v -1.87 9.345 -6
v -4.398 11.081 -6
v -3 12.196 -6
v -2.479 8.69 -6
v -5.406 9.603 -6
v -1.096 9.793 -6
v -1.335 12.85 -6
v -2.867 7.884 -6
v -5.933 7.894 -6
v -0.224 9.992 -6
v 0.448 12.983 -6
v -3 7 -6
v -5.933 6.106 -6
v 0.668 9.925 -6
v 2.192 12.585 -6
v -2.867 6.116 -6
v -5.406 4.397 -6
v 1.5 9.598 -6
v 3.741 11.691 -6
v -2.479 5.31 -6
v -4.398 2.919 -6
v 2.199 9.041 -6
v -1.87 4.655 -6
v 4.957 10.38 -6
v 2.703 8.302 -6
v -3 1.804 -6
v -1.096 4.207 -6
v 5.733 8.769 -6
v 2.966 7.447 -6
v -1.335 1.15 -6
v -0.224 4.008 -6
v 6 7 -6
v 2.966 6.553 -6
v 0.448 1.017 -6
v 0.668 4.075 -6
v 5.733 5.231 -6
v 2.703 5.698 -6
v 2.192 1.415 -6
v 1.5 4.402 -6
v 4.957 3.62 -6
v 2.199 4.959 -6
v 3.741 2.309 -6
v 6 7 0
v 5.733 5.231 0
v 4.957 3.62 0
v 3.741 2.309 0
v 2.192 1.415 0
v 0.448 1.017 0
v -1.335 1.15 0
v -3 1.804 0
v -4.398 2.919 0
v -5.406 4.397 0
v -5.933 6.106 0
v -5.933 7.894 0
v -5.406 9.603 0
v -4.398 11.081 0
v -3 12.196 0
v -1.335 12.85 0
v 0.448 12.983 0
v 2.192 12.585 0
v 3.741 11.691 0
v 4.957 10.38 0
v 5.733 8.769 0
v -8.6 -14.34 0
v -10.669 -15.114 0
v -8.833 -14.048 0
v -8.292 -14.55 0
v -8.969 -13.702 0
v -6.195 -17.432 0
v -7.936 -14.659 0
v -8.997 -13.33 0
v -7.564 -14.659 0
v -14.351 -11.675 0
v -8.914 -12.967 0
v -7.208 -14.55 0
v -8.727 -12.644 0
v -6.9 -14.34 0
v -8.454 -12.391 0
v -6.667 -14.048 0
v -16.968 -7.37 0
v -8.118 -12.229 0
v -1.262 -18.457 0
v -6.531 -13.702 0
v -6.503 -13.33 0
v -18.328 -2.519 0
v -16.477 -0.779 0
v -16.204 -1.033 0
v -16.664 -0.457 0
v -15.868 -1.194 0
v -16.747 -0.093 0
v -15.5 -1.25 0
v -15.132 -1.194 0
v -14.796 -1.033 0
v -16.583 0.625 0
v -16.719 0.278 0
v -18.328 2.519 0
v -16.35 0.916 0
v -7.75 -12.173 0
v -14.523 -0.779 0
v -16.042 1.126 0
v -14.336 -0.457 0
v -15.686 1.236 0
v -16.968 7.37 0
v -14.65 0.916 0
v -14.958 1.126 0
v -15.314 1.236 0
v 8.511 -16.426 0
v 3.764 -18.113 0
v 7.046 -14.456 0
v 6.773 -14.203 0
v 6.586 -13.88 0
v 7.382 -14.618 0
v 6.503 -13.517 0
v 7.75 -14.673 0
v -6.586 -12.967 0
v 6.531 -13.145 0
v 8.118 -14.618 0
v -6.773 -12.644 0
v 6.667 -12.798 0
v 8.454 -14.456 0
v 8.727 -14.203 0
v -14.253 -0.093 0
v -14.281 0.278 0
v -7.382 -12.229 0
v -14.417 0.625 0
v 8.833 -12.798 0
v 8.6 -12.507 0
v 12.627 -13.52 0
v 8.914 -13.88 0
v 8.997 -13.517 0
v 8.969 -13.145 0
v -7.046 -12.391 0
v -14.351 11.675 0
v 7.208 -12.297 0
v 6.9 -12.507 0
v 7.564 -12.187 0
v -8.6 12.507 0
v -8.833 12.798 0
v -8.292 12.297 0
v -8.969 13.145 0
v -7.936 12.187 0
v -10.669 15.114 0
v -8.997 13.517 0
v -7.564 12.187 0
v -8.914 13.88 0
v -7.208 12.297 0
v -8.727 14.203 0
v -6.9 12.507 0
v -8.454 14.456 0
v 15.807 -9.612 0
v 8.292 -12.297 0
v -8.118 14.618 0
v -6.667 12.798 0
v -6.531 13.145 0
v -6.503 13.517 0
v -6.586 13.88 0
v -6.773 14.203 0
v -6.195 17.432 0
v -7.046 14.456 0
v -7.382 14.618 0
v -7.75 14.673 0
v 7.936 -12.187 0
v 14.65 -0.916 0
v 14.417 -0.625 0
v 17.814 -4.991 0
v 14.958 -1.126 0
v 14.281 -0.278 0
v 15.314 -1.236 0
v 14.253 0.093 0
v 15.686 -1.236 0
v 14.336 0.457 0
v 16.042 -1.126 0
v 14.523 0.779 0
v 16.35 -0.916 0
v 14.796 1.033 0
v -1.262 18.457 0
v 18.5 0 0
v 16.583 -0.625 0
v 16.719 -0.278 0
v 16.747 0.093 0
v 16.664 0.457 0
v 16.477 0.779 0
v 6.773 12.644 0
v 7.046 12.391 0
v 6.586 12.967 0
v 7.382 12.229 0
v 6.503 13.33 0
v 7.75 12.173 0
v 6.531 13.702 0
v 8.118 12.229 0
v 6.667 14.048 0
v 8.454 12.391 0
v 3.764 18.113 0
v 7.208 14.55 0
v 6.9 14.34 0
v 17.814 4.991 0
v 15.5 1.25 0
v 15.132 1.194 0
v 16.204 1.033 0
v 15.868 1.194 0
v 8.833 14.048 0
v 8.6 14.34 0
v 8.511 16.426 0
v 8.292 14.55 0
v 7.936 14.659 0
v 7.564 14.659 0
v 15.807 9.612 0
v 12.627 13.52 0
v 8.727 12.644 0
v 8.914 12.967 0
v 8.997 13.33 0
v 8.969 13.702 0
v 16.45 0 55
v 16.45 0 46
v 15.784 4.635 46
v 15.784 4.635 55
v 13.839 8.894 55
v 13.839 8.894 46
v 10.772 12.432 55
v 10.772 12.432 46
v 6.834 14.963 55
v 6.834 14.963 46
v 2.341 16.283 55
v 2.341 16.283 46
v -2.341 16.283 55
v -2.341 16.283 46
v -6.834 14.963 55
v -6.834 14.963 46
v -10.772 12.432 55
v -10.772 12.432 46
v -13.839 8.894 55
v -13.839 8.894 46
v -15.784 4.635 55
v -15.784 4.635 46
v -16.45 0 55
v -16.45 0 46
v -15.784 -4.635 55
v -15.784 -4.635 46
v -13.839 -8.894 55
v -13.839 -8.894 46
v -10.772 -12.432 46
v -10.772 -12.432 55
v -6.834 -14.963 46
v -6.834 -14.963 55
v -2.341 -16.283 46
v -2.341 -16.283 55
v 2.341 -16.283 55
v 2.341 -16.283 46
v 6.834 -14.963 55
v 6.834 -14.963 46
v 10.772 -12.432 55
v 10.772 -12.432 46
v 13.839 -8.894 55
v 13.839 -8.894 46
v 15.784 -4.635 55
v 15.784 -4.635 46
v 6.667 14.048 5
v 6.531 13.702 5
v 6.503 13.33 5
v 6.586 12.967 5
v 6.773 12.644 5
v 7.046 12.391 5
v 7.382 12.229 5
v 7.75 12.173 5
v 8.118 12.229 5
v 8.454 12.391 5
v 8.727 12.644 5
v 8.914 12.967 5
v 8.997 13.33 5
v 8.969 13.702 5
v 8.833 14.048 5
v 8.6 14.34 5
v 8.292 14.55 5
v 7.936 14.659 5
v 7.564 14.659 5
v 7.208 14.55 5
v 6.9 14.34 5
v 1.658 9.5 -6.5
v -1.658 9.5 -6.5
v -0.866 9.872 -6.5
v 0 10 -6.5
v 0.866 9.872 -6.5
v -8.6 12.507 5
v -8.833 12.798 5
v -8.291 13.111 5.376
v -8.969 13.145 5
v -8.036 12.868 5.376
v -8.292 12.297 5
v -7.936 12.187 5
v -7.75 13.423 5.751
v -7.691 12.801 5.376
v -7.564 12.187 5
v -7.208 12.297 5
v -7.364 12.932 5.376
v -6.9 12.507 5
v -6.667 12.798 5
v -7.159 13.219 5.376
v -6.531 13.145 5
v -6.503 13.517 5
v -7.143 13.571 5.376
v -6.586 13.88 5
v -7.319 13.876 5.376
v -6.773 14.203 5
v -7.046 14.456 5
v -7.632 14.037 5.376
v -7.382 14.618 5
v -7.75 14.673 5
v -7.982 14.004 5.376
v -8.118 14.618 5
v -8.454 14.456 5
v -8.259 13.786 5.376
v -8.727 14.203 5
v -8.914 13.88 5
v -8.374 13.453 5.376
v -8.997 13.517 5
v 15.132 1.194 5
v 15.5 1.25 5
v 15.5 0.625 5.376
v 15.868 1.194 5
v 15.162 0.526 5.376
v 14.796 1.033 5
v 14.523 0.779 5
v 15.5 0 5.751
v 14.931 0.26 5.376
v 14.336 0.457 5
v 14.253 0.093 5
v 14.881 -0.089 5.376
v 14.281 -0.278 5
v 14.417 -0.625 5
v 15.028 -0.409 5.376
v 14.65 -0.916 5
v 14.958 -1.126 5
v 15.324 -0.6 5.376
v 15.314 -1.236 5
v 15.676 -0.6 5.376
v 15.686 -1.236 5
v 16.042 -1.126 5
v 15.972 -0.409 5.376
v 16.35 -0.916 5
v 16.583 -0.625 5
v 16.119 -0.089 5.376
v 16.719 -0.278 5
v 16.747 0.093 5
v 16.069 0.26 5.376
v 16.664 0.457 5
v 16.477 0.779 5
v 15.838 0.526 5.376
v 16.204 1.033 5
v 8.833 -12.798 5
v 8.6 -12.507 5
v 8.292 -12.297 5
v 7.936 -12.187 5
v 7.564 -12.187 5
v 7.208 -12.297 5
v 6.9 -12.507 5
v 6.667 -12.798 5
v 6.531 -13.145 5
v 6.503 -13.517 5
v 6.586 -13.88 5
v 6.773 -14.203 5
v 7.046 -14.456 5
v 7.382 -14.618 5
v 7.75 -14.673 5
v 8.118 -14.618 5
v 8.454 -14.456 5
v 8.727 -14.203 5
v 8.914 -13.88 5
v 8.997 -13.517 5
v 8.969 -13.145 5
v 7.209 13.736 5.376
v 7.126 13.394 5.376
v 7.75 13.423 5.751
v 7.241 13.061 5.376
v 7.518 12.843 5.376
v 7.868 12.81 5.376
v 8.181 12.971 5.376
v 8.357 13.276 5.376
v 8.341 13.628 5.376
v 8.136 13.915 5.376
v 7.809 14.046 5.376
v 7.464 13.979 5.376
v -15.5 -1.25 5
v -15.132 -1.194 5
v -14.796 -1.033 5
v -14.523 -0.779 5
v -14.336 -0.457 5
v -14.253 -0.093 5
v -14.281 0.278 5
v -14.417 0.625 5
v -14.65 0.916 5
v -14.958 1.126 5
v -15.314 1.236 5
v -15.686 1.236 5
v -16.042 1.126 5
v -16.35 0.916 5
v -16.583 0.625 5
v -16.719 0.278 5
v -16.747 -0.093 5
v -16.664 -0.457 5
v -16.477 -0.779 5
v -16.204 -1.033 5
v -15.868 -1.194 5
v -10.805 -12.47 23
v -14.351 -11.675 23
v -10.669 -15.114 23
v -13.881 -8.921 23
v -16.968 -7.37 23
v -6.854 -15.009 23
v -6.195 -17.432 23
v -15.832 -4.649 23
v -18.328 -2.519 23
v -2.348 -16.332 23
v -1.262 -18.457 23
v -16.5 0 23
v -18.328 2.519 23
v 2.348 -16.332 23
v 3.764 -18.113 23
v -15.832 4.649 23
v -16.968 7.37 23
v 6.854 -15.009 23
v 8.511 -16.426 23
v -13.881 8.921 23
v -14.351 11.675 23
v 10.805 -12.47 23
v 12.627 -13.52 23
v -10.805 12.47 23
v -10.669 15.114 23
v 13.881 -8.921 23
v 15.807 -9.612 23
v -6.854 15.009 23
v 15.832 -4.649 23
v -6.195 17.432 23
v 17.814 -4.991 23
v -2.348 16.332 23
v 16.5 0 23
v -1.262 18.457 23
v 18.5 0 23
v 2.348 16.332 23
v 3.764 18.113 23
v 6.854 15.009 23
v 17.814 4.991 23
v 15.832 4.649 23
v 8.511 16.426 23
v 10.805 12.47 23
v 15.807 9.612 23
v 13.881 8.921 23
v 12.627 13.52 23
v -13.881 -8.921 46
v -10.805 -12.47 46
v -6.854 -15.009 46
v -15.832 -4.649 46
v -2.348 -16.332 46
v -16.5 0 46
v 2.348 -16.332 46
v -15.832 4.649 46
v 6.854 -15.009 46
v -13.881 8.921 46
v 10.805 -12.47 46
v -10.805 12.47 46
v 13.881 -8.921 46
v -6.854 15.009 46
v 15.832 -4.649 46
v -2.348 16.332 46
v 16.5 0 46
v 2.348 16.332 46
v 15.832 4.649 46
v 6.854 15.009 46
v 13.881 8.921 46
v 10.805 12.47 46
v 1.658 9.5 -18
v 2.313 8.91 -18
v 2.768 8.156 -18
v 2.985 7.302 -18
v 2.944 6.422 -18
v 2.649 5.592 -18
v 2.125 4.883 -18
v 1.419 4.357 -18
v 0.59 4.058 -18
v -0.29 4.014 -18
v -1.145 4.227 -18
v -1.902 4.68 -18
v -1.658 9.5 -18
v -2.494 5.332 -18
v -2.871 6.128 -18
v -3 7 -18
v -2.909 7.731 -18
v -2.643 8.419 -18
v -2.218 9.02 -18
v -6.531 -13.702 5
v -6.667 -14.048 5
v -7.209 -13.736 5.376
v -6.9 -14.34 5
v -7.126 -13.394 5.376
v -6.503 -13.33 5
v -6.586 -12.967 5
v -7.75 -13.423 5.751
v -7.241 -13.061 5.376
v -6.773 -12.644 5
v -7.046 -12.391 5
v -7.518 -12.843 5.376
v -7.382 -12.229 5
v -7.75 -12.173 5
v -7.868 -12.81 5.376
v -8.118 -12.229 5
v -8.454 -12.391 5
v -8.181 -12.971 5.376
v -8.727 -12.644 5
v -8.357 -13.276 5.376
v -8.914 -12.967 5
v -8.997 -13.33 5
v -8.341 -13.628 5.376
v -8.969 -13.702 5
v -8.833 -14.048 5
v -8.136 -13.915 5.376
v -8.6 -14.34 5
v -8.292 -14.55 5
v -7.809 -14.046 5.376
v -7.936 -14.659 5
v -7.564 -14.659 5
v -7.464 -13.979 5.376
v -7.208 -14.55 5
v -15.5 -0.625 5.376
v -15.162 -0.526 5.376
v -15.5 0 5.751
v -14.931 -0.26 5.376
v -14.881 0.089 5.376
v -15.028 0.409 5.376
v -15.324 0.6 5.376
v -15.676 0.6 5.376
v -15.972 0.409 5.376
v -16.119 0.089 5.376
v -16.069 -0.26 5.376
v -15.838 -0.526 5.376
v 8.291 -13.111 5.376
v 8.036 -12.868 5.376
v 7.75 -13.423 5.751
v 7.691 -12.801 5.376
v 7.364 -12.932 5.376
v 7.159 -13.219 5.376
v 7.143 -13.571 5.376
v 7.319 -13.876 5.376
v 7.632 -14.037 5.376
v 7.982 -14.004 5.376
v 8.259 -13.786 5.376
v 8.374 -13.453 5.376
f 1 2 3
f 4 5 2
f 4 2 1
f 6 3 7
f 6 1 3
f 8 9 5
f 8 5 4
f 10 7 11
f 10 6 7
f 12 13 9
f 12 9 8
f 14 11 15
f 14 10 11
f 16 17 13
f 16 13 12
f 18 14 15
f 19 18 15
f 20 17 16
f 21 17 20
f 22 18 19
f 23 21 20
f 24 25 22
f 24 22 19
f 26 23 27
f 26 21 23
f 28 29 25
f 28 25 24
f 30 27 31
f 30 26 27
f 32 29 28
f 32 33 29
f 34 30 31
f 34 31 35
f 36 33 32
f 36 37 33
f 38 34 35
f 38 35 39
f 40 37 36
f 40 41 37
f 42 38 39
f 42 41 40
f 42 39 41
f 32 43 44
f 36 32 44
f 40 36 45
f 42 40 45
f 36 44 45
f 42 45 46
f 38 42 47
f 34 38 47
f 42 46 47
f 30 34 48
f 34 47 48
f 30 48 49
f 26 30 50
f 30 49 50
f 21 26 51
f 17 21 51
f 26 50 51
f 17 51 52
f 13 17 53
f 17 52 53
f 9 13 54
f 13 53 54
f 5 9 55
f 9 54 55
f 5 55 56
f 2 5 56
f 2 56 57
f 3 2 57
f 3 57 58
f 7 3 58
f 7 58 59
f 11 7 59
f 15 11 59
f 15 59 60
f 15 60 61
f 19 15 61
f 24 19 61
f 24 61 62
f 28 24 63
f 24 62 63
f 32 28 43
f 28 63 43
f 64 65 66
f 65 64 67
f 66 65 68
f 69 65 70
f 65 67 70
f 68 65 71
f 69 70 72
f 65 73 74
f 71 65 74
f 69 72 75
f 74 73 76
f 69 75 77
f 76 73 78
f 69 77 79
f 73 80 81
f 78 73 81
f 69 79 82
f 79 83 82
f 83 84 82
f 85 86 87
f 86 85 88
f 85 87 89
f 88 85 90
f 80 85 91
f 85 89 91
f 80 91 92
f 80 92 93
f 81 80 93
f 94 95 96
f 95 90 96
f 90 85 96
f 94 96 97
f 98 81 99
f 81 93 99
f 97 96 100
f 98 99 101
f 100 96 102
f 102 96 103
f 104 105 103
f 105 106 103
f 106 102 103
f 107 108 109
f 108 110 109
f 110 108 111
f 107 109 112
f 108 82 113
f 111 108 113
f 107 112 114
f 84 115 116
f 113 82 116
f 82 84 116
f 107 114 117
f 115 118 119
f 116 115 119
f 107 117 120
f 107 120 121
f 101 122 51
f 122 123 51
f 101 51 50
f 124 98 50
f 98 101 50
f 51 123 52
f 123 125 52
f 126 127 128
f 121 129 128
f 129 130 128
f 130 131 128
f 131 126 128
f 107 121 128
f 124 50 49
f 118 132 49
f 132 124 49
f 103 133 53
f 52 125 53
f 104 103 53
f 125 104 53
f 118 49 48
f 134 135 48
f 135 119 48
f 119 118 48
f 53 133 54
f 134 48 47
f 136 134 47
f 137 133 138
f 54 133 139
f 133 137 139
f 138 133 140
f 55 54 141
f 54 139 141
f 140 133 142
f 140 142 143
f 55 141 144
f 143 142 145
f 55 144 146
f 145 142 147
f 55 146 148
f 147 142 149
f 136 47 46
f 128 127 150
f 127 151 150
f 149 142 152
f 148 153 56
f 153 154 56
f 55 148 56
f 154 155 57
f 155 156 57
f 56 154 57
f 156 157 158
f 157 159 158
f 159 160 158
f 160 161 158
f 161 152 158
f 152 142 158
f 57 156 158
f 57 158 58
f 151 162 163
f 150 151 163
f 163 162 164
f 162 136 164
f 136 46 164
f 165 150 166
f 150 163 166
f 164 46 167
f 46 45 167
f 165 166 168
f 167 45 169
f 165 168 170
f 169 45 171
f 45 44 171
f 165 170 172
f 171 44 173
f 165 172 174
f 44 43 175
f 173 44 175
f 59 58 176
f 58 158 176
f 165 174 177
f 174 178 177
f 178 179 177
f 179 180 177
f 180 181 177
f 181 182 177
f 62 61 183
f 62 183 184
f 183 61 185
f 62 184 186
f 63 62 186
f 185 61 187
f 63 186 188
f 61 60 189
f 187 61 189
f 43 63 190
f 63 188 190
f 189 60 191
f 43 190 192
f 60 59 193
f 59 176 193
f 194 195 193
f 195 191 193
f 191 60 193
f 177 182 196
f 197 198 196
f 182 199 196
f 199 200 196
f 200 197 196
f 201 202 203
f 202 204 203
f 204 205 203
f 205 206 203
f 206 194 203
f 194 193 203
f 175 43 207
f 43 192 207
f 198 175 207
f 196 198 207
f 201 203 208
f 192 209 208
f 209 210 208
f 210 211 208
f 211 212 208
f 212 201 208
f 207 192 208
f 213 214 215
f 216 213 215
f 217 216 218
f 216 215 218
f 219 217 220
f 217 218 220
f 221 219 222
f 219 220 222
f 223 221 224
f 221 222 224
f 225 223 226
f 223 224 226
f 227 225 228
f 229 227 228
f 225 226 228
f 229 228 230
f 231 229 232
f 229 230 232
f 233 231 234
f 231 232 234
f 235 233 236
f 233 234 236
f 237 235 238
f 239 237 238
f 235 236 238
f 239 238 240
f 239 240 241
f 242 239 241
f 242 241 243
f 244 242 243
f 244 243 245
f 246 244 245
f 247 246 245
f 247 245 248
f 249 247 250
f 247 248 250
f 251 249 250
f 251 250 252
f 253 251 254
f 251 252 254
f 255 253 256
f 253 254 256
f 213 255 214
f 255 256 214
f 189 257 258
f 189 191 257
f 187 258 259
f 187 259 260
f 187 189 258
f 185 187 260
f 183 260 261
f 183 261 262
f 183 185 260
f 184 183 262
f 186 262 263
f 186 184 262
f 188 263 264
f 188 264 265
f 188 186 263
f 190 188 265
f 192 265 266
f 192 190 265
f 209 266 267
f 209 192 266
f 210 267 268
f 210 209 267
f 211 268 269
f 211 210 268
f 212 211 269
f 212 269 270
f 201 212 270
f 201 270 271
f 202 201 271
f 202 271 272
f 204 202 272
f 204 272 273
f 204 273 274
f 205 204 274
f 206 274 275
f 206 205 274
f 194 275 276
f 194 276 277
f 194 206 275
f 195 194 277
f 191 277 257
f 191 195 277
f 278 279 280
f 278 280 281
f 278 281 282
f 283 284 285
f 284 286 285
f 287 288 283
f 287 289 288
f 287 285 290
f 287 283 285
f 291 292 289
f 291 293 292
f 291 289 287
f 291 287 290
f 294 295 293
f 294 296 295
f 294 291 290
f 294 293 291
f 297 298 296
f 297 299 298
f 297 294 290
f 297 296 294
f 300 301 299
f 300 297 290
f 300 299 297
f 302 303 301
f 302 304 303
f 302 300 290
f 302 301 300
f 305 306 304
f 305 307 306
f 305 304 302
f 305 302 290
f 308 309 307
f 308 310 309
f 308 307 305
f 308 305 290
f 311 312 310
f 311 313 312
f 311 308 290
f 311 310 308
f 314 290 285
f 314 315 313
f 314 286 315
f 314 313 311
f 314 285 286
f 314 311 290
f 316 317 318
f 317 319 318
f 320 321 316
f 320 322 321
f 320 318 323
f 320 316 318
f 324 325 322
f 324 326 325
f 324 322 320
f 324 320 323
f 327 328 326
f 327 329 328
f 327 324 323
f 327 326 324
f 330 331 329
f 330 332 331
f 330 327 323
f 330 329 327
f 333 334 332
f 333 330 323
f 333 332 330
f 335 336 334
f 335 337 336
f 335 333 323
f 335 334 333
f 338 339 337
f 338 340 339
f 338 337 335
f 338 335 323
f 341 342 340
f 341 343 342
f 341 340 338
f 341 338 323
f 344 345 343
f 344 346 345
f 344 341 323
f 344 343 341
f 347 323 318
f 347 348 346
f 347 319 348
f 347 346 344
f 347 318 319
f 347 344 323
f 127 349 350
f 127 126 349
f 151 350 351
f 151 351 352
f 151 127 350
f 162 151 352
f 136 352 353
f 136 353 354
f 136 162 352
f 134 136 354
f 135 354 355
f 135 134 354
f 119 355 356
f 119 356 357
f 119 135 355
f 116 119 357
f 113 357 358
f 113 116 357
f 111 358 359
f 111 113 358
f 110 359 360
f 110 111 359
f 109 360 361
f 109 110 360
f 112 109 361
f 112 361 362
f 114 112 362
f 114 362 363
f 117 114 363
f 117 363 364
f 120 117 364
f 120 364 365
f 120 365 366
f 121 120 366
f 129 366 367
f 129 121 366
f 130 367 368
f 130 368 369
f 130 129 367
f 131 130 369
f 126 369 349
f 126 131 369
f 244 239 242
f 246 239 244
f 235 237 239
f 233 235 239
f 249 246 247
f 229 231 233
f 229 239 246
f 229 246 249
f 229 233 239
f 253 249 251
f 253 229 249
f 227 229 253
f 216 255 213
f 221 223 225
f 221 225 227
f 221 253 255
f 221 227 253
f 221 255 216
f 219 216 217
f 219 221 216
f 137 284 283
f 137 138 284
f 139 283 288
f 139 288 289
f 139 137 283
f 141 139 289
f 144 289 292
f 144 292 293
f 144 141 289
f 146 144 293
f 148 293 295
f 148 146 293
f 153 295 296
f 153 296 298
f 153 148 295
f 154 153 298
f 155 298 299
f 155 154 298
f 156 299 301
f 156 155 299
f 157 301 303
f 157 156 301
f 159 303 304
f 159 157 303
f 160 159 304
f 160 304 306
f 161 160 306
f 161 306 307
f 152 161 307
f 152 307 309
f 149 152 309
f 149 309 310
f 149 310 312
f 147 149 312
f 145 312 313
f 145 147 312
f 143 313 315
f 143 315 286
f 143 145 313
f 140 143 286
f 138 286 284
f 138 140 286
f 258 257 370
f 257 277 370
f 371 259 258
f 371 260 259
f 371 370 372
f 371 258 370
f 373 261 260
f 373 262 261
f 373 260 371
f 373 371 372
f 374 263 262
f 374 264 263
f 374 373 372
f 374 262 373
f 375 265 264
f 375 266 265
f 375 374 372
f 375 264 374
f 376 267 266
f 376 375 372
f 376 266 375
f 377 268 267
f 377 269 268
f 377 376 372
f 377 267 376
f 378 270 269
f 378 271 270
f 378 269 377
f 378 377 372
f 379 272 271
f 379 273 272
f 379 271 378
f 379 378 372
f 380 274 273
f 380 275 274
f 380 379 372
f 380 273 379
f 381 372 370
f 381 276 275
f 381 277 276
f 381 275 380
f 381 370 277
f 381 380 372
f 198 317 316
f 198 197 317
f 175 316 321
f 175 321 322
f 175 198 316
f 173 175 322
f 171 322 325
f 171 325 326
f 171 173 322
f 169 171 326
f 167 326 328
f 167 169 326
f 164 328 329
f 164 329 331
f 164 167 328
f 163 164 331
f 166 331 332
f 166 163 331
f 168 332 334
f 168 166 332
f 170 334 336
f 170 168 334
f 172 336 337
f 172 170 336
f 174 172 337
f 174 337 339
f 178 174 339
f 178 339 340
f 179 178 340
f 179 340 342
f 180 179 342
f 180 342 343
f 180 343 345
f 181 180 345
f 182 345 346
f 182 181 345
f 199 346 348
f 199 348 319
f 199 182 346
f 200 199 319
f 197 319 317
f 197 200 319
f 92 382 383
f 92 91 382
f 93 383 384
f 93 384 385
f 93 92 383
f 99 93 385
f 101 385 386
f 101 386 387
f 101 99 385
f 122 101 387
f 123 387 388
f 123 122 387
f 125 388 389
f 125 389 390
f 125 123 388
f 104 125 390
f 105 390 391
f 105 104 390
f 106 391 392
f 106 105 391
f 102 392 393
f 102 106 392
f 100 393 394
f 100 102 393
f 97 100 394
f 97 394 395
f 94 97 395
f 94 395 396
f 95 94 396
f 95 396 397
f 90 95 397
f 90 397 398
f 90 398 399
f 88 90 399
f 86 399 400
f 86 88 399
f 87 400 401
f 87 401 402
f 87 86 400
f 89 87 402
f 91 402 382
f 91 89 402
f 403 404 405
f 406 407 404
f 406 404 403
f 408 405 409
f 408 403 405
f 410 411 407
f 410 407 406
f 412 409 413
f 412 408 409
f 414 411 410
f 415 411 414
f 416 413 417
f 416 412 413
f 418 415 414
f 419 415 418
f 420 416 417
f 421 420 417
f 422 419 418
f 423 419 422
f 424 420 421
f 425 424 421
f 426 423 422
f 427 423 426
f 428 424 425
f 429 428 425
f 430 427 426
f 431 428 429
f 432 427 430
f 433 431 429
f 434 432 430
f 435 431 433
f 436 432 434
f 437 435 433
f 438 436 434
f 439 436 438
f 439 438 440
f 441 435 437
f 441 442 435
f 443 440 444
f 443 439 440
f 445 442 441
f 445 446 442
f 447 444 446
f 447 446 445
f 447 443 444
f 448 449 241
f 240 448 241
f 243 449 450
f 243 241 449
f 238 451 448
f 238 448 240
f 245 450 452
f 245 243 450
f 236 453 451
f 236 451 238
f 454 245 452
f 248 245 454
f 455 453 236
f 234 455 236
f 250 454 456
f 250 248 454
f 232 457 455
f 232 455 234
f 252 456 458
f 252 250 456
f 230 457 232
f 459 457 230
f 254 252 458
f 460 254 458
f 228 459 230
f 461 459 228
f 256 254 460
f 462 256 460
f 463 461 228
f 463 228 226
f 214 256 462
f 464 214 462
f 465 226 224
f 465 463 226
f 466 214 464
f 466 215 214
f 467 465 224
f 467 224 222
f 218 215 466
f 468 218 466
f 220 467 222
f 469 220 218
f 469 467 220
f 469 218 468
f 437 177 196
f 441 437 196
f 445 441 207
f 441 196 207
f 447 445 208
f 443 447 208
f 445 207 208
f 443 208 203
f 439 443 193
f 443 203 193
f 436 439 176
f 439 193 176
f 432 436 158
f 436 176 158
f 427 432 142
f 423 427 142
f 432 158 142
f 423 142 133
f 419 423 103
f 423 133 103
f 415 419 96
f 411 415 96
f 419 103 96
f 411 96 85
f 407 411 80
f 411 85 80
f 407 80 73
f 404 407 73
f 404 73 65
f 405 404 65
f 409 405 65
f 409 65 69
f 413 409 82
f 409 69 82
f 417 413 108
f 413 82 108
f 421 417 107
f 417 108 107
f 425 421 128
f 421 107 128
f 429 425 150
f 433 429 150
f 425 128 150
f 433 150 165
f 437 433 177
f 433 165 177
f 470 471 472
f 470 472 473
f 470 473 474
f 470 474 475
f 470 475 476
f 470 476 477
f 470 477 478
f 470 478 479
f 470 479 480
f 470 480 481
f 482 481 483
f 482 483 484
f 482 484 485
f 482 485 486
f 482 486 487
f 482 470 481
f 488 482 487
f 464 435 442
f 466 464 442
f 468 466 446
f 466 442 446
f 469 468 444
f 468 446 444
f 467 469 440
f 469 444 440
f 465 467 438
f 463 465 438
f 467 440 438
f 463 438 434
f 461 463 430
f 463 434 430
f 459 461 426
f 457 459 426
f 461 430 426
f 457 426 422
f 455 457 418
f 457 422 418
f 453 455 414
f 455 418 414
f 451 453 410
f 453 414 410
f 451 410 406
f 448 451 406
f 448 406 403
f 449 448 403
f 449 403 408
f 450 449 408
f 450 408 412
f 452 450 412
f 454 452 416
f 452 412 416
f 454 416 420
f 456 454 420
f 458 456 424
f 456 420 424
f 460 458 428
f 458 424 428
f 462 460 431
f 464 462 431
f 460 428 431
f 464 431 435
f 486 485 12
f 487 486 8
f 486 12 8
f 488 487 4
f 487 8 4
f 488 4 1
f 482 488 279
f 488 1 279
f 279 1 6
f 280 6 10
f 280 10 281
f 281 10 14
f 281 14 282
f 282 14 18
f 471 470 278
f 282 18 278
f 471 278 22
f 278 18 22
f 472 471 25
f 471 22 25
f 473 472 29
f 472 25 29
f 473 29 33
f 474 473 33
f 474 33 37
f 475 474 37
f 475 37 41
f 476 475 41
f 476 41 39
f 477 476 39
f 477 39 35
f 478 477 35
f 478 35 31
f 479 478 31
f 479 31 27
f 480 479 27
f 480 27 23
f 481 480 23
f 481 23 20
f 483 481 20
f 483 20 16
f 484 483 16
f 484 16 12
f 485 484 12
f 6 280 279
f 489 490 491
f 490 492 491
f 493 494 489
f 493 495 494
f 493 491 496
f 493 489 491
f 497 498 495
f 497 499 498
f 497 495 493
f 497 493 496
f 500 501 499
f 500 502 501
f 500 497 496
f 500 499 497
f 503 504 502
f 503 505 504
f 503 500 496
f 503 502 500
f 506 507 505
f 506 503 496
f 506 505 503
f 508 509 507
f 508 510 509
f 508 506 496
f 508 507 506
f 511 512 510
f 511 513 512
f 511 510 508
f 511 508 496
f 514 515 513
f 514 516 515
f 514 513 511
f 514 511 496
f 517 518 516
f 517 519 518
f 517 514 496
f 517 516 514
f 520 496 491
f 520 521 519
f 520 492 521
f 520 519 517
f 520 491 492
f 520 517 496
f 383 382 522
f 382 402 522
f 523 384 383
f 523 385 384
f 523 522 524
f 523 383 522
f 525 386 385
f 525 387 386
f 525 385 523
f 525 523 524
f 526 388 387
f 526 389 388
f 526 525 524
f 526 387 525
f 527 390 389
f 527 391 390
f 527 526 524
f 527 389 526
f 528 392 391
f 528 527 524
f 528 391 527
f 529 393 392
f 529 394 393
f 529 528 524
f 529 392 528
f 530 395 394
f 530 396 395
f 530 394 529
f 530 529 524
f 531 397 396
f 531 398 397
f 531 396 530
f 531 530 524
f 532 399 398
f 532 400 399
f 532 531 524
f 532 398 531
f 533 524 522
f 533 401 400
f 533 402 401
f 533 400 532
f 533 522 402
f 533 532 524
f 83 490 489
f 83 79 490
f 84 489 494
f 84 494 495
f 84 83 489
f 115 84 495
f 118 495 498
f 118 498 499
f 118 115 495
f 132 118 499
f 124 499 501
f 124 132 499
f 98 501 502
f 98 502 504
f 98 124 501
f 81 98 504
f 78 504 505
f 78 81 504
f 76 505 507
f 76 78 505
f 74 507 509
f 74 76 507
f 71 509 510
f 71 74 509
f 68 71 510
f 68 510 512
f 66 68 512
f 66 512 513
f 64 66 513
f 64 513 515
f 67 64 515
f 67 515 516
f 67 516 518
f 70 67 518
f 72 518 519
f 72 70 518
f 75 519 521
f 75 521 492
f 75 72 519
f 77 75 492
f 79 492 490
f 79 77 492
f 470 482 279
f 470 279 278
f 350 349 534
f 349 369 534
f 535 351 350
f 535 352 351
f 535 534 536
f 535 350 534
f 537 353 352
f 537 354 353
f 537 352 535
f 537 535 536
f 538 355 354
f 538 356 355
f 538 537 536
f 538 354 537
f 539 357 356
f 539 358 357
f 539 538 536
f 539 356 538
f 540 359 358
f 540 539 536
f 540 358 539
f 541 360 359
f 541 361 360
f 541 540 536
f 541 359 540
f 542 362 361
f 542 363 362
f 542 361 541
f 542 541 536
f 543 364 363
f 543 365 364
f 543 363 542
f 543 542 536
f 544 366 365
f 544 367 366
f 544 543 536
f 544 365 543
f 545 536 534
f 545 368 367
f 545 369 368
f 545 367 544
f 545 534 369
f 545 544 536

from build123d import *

# Parameters (mm, degrees)
SKETCH1_R           = 18.5
BOSS_EXTRUDE1_DEPTH = 23
SKETCH2_R           = 16.5
BOSS_EXTRUDE2_DEPTH = 23
SKETCH3_R           = 6
BOSS_EXTRUDE3_DEPTH = 6
SKETCH4_R           = 3
BOSS_EXTRUDE4_DEPTH = 12
SKETCH5_W           = 6
SKETCH5_H           = 11.5
CUT_EXTRUDE1_DEPTH  = 12
CIRPATTERN1_COUNT   = 6
SKETCH9_R           = 16.45
BOSS_EXTRUDE5_DEPTH = 9


with BuildPart() as part:
    # Sketch1 → Boss-Extrude1 (new body)
    with BuildSketch(Plane.XY):
        Circle(SKETCH1_R)
    extrude(amount=BOSS_EXTRUDE1_DEPTH)

    # Sketch2 → Boss-Extrude2 (add)
    with BuildSketch(Plane.XY.offset(23)):
        Circle(SKETCH2_R)
    extrude(amount=BOSS_EXTRUDE2_DEPTH)

    # Sketch3 → Boss-Extrude3 (add)
    with BuildSketch(Plane(origin=(0, 0, 0), x_dir=(-1, 0, 0), z_dir=(0, 0, -1))):
        with Locations(Location((0, 7, 0), (0, 0, 180))):
            Circle(SKETCH3_R)
    extrude(amount=BOSS_EXTRUDE3_DEPTH)

    # Sketch4 → Boss-Extrude4 (add)
    with BuildSketch(Plane(origin=(0, 0, -6), x_dir=(-1, 0, 0), z_dir=(0, 0, -1))):
        with Locations((0, 7)):
            Circle(SKETCH4_R)
    extrude(amount=BOSS_EXTRUDE4_DEPTH)

    # Sketch5 → Cut-Extrude1 (cut)
    with BuildSketch(Plane(origin=(0, 9.5, 0), x_dir=(1, 0, 0), z_dir=(0, 1, 0))):
        with Locations((0, 12.25)):
            Rectangle(SKETCH5_W, SKETCH5_H)
    extrude(amount=CUT_EXTRUDE1_DEPTH, mode=Mode.SUBTRACT)

    # Sketch8 → M3 Tapped Hole1 (revolve, cut)
    with BuildSketch(Plane.YZ.offset(15.5)):
        Polygon((0, 0), (0, 5.751075774), (1.25, 5), (1.25, 0), align=None)
    m3_tapped_hole1 = revolve(axis=Axis((15.5, 0, -6.35), (0, 0, 1)), mode=Mode.SUBTRACT)

    # CirPattern1: M3 Tapped Hole1 ×6 about axis
    cirpattern1_axis = Axis((0, 0, 0), (0, 0, 1))
    for i in range(1, CIRPATTERN1_COUNT):
        add(m3_tapped_hole1.rotate(cirpattern1_axis, i * 360 / CIRPATTERN1_COUNT), mode=Mode.SUBTRACT)

    # Sketch9 → Boss-Extrude5 (add)
    with BuildSketch(Plane.XY.offset(46)):
        Circle(SKETCH9_R)
    extrude(amount=BOSS_EXTRUDE5_DEPTH)


solid = part.part
